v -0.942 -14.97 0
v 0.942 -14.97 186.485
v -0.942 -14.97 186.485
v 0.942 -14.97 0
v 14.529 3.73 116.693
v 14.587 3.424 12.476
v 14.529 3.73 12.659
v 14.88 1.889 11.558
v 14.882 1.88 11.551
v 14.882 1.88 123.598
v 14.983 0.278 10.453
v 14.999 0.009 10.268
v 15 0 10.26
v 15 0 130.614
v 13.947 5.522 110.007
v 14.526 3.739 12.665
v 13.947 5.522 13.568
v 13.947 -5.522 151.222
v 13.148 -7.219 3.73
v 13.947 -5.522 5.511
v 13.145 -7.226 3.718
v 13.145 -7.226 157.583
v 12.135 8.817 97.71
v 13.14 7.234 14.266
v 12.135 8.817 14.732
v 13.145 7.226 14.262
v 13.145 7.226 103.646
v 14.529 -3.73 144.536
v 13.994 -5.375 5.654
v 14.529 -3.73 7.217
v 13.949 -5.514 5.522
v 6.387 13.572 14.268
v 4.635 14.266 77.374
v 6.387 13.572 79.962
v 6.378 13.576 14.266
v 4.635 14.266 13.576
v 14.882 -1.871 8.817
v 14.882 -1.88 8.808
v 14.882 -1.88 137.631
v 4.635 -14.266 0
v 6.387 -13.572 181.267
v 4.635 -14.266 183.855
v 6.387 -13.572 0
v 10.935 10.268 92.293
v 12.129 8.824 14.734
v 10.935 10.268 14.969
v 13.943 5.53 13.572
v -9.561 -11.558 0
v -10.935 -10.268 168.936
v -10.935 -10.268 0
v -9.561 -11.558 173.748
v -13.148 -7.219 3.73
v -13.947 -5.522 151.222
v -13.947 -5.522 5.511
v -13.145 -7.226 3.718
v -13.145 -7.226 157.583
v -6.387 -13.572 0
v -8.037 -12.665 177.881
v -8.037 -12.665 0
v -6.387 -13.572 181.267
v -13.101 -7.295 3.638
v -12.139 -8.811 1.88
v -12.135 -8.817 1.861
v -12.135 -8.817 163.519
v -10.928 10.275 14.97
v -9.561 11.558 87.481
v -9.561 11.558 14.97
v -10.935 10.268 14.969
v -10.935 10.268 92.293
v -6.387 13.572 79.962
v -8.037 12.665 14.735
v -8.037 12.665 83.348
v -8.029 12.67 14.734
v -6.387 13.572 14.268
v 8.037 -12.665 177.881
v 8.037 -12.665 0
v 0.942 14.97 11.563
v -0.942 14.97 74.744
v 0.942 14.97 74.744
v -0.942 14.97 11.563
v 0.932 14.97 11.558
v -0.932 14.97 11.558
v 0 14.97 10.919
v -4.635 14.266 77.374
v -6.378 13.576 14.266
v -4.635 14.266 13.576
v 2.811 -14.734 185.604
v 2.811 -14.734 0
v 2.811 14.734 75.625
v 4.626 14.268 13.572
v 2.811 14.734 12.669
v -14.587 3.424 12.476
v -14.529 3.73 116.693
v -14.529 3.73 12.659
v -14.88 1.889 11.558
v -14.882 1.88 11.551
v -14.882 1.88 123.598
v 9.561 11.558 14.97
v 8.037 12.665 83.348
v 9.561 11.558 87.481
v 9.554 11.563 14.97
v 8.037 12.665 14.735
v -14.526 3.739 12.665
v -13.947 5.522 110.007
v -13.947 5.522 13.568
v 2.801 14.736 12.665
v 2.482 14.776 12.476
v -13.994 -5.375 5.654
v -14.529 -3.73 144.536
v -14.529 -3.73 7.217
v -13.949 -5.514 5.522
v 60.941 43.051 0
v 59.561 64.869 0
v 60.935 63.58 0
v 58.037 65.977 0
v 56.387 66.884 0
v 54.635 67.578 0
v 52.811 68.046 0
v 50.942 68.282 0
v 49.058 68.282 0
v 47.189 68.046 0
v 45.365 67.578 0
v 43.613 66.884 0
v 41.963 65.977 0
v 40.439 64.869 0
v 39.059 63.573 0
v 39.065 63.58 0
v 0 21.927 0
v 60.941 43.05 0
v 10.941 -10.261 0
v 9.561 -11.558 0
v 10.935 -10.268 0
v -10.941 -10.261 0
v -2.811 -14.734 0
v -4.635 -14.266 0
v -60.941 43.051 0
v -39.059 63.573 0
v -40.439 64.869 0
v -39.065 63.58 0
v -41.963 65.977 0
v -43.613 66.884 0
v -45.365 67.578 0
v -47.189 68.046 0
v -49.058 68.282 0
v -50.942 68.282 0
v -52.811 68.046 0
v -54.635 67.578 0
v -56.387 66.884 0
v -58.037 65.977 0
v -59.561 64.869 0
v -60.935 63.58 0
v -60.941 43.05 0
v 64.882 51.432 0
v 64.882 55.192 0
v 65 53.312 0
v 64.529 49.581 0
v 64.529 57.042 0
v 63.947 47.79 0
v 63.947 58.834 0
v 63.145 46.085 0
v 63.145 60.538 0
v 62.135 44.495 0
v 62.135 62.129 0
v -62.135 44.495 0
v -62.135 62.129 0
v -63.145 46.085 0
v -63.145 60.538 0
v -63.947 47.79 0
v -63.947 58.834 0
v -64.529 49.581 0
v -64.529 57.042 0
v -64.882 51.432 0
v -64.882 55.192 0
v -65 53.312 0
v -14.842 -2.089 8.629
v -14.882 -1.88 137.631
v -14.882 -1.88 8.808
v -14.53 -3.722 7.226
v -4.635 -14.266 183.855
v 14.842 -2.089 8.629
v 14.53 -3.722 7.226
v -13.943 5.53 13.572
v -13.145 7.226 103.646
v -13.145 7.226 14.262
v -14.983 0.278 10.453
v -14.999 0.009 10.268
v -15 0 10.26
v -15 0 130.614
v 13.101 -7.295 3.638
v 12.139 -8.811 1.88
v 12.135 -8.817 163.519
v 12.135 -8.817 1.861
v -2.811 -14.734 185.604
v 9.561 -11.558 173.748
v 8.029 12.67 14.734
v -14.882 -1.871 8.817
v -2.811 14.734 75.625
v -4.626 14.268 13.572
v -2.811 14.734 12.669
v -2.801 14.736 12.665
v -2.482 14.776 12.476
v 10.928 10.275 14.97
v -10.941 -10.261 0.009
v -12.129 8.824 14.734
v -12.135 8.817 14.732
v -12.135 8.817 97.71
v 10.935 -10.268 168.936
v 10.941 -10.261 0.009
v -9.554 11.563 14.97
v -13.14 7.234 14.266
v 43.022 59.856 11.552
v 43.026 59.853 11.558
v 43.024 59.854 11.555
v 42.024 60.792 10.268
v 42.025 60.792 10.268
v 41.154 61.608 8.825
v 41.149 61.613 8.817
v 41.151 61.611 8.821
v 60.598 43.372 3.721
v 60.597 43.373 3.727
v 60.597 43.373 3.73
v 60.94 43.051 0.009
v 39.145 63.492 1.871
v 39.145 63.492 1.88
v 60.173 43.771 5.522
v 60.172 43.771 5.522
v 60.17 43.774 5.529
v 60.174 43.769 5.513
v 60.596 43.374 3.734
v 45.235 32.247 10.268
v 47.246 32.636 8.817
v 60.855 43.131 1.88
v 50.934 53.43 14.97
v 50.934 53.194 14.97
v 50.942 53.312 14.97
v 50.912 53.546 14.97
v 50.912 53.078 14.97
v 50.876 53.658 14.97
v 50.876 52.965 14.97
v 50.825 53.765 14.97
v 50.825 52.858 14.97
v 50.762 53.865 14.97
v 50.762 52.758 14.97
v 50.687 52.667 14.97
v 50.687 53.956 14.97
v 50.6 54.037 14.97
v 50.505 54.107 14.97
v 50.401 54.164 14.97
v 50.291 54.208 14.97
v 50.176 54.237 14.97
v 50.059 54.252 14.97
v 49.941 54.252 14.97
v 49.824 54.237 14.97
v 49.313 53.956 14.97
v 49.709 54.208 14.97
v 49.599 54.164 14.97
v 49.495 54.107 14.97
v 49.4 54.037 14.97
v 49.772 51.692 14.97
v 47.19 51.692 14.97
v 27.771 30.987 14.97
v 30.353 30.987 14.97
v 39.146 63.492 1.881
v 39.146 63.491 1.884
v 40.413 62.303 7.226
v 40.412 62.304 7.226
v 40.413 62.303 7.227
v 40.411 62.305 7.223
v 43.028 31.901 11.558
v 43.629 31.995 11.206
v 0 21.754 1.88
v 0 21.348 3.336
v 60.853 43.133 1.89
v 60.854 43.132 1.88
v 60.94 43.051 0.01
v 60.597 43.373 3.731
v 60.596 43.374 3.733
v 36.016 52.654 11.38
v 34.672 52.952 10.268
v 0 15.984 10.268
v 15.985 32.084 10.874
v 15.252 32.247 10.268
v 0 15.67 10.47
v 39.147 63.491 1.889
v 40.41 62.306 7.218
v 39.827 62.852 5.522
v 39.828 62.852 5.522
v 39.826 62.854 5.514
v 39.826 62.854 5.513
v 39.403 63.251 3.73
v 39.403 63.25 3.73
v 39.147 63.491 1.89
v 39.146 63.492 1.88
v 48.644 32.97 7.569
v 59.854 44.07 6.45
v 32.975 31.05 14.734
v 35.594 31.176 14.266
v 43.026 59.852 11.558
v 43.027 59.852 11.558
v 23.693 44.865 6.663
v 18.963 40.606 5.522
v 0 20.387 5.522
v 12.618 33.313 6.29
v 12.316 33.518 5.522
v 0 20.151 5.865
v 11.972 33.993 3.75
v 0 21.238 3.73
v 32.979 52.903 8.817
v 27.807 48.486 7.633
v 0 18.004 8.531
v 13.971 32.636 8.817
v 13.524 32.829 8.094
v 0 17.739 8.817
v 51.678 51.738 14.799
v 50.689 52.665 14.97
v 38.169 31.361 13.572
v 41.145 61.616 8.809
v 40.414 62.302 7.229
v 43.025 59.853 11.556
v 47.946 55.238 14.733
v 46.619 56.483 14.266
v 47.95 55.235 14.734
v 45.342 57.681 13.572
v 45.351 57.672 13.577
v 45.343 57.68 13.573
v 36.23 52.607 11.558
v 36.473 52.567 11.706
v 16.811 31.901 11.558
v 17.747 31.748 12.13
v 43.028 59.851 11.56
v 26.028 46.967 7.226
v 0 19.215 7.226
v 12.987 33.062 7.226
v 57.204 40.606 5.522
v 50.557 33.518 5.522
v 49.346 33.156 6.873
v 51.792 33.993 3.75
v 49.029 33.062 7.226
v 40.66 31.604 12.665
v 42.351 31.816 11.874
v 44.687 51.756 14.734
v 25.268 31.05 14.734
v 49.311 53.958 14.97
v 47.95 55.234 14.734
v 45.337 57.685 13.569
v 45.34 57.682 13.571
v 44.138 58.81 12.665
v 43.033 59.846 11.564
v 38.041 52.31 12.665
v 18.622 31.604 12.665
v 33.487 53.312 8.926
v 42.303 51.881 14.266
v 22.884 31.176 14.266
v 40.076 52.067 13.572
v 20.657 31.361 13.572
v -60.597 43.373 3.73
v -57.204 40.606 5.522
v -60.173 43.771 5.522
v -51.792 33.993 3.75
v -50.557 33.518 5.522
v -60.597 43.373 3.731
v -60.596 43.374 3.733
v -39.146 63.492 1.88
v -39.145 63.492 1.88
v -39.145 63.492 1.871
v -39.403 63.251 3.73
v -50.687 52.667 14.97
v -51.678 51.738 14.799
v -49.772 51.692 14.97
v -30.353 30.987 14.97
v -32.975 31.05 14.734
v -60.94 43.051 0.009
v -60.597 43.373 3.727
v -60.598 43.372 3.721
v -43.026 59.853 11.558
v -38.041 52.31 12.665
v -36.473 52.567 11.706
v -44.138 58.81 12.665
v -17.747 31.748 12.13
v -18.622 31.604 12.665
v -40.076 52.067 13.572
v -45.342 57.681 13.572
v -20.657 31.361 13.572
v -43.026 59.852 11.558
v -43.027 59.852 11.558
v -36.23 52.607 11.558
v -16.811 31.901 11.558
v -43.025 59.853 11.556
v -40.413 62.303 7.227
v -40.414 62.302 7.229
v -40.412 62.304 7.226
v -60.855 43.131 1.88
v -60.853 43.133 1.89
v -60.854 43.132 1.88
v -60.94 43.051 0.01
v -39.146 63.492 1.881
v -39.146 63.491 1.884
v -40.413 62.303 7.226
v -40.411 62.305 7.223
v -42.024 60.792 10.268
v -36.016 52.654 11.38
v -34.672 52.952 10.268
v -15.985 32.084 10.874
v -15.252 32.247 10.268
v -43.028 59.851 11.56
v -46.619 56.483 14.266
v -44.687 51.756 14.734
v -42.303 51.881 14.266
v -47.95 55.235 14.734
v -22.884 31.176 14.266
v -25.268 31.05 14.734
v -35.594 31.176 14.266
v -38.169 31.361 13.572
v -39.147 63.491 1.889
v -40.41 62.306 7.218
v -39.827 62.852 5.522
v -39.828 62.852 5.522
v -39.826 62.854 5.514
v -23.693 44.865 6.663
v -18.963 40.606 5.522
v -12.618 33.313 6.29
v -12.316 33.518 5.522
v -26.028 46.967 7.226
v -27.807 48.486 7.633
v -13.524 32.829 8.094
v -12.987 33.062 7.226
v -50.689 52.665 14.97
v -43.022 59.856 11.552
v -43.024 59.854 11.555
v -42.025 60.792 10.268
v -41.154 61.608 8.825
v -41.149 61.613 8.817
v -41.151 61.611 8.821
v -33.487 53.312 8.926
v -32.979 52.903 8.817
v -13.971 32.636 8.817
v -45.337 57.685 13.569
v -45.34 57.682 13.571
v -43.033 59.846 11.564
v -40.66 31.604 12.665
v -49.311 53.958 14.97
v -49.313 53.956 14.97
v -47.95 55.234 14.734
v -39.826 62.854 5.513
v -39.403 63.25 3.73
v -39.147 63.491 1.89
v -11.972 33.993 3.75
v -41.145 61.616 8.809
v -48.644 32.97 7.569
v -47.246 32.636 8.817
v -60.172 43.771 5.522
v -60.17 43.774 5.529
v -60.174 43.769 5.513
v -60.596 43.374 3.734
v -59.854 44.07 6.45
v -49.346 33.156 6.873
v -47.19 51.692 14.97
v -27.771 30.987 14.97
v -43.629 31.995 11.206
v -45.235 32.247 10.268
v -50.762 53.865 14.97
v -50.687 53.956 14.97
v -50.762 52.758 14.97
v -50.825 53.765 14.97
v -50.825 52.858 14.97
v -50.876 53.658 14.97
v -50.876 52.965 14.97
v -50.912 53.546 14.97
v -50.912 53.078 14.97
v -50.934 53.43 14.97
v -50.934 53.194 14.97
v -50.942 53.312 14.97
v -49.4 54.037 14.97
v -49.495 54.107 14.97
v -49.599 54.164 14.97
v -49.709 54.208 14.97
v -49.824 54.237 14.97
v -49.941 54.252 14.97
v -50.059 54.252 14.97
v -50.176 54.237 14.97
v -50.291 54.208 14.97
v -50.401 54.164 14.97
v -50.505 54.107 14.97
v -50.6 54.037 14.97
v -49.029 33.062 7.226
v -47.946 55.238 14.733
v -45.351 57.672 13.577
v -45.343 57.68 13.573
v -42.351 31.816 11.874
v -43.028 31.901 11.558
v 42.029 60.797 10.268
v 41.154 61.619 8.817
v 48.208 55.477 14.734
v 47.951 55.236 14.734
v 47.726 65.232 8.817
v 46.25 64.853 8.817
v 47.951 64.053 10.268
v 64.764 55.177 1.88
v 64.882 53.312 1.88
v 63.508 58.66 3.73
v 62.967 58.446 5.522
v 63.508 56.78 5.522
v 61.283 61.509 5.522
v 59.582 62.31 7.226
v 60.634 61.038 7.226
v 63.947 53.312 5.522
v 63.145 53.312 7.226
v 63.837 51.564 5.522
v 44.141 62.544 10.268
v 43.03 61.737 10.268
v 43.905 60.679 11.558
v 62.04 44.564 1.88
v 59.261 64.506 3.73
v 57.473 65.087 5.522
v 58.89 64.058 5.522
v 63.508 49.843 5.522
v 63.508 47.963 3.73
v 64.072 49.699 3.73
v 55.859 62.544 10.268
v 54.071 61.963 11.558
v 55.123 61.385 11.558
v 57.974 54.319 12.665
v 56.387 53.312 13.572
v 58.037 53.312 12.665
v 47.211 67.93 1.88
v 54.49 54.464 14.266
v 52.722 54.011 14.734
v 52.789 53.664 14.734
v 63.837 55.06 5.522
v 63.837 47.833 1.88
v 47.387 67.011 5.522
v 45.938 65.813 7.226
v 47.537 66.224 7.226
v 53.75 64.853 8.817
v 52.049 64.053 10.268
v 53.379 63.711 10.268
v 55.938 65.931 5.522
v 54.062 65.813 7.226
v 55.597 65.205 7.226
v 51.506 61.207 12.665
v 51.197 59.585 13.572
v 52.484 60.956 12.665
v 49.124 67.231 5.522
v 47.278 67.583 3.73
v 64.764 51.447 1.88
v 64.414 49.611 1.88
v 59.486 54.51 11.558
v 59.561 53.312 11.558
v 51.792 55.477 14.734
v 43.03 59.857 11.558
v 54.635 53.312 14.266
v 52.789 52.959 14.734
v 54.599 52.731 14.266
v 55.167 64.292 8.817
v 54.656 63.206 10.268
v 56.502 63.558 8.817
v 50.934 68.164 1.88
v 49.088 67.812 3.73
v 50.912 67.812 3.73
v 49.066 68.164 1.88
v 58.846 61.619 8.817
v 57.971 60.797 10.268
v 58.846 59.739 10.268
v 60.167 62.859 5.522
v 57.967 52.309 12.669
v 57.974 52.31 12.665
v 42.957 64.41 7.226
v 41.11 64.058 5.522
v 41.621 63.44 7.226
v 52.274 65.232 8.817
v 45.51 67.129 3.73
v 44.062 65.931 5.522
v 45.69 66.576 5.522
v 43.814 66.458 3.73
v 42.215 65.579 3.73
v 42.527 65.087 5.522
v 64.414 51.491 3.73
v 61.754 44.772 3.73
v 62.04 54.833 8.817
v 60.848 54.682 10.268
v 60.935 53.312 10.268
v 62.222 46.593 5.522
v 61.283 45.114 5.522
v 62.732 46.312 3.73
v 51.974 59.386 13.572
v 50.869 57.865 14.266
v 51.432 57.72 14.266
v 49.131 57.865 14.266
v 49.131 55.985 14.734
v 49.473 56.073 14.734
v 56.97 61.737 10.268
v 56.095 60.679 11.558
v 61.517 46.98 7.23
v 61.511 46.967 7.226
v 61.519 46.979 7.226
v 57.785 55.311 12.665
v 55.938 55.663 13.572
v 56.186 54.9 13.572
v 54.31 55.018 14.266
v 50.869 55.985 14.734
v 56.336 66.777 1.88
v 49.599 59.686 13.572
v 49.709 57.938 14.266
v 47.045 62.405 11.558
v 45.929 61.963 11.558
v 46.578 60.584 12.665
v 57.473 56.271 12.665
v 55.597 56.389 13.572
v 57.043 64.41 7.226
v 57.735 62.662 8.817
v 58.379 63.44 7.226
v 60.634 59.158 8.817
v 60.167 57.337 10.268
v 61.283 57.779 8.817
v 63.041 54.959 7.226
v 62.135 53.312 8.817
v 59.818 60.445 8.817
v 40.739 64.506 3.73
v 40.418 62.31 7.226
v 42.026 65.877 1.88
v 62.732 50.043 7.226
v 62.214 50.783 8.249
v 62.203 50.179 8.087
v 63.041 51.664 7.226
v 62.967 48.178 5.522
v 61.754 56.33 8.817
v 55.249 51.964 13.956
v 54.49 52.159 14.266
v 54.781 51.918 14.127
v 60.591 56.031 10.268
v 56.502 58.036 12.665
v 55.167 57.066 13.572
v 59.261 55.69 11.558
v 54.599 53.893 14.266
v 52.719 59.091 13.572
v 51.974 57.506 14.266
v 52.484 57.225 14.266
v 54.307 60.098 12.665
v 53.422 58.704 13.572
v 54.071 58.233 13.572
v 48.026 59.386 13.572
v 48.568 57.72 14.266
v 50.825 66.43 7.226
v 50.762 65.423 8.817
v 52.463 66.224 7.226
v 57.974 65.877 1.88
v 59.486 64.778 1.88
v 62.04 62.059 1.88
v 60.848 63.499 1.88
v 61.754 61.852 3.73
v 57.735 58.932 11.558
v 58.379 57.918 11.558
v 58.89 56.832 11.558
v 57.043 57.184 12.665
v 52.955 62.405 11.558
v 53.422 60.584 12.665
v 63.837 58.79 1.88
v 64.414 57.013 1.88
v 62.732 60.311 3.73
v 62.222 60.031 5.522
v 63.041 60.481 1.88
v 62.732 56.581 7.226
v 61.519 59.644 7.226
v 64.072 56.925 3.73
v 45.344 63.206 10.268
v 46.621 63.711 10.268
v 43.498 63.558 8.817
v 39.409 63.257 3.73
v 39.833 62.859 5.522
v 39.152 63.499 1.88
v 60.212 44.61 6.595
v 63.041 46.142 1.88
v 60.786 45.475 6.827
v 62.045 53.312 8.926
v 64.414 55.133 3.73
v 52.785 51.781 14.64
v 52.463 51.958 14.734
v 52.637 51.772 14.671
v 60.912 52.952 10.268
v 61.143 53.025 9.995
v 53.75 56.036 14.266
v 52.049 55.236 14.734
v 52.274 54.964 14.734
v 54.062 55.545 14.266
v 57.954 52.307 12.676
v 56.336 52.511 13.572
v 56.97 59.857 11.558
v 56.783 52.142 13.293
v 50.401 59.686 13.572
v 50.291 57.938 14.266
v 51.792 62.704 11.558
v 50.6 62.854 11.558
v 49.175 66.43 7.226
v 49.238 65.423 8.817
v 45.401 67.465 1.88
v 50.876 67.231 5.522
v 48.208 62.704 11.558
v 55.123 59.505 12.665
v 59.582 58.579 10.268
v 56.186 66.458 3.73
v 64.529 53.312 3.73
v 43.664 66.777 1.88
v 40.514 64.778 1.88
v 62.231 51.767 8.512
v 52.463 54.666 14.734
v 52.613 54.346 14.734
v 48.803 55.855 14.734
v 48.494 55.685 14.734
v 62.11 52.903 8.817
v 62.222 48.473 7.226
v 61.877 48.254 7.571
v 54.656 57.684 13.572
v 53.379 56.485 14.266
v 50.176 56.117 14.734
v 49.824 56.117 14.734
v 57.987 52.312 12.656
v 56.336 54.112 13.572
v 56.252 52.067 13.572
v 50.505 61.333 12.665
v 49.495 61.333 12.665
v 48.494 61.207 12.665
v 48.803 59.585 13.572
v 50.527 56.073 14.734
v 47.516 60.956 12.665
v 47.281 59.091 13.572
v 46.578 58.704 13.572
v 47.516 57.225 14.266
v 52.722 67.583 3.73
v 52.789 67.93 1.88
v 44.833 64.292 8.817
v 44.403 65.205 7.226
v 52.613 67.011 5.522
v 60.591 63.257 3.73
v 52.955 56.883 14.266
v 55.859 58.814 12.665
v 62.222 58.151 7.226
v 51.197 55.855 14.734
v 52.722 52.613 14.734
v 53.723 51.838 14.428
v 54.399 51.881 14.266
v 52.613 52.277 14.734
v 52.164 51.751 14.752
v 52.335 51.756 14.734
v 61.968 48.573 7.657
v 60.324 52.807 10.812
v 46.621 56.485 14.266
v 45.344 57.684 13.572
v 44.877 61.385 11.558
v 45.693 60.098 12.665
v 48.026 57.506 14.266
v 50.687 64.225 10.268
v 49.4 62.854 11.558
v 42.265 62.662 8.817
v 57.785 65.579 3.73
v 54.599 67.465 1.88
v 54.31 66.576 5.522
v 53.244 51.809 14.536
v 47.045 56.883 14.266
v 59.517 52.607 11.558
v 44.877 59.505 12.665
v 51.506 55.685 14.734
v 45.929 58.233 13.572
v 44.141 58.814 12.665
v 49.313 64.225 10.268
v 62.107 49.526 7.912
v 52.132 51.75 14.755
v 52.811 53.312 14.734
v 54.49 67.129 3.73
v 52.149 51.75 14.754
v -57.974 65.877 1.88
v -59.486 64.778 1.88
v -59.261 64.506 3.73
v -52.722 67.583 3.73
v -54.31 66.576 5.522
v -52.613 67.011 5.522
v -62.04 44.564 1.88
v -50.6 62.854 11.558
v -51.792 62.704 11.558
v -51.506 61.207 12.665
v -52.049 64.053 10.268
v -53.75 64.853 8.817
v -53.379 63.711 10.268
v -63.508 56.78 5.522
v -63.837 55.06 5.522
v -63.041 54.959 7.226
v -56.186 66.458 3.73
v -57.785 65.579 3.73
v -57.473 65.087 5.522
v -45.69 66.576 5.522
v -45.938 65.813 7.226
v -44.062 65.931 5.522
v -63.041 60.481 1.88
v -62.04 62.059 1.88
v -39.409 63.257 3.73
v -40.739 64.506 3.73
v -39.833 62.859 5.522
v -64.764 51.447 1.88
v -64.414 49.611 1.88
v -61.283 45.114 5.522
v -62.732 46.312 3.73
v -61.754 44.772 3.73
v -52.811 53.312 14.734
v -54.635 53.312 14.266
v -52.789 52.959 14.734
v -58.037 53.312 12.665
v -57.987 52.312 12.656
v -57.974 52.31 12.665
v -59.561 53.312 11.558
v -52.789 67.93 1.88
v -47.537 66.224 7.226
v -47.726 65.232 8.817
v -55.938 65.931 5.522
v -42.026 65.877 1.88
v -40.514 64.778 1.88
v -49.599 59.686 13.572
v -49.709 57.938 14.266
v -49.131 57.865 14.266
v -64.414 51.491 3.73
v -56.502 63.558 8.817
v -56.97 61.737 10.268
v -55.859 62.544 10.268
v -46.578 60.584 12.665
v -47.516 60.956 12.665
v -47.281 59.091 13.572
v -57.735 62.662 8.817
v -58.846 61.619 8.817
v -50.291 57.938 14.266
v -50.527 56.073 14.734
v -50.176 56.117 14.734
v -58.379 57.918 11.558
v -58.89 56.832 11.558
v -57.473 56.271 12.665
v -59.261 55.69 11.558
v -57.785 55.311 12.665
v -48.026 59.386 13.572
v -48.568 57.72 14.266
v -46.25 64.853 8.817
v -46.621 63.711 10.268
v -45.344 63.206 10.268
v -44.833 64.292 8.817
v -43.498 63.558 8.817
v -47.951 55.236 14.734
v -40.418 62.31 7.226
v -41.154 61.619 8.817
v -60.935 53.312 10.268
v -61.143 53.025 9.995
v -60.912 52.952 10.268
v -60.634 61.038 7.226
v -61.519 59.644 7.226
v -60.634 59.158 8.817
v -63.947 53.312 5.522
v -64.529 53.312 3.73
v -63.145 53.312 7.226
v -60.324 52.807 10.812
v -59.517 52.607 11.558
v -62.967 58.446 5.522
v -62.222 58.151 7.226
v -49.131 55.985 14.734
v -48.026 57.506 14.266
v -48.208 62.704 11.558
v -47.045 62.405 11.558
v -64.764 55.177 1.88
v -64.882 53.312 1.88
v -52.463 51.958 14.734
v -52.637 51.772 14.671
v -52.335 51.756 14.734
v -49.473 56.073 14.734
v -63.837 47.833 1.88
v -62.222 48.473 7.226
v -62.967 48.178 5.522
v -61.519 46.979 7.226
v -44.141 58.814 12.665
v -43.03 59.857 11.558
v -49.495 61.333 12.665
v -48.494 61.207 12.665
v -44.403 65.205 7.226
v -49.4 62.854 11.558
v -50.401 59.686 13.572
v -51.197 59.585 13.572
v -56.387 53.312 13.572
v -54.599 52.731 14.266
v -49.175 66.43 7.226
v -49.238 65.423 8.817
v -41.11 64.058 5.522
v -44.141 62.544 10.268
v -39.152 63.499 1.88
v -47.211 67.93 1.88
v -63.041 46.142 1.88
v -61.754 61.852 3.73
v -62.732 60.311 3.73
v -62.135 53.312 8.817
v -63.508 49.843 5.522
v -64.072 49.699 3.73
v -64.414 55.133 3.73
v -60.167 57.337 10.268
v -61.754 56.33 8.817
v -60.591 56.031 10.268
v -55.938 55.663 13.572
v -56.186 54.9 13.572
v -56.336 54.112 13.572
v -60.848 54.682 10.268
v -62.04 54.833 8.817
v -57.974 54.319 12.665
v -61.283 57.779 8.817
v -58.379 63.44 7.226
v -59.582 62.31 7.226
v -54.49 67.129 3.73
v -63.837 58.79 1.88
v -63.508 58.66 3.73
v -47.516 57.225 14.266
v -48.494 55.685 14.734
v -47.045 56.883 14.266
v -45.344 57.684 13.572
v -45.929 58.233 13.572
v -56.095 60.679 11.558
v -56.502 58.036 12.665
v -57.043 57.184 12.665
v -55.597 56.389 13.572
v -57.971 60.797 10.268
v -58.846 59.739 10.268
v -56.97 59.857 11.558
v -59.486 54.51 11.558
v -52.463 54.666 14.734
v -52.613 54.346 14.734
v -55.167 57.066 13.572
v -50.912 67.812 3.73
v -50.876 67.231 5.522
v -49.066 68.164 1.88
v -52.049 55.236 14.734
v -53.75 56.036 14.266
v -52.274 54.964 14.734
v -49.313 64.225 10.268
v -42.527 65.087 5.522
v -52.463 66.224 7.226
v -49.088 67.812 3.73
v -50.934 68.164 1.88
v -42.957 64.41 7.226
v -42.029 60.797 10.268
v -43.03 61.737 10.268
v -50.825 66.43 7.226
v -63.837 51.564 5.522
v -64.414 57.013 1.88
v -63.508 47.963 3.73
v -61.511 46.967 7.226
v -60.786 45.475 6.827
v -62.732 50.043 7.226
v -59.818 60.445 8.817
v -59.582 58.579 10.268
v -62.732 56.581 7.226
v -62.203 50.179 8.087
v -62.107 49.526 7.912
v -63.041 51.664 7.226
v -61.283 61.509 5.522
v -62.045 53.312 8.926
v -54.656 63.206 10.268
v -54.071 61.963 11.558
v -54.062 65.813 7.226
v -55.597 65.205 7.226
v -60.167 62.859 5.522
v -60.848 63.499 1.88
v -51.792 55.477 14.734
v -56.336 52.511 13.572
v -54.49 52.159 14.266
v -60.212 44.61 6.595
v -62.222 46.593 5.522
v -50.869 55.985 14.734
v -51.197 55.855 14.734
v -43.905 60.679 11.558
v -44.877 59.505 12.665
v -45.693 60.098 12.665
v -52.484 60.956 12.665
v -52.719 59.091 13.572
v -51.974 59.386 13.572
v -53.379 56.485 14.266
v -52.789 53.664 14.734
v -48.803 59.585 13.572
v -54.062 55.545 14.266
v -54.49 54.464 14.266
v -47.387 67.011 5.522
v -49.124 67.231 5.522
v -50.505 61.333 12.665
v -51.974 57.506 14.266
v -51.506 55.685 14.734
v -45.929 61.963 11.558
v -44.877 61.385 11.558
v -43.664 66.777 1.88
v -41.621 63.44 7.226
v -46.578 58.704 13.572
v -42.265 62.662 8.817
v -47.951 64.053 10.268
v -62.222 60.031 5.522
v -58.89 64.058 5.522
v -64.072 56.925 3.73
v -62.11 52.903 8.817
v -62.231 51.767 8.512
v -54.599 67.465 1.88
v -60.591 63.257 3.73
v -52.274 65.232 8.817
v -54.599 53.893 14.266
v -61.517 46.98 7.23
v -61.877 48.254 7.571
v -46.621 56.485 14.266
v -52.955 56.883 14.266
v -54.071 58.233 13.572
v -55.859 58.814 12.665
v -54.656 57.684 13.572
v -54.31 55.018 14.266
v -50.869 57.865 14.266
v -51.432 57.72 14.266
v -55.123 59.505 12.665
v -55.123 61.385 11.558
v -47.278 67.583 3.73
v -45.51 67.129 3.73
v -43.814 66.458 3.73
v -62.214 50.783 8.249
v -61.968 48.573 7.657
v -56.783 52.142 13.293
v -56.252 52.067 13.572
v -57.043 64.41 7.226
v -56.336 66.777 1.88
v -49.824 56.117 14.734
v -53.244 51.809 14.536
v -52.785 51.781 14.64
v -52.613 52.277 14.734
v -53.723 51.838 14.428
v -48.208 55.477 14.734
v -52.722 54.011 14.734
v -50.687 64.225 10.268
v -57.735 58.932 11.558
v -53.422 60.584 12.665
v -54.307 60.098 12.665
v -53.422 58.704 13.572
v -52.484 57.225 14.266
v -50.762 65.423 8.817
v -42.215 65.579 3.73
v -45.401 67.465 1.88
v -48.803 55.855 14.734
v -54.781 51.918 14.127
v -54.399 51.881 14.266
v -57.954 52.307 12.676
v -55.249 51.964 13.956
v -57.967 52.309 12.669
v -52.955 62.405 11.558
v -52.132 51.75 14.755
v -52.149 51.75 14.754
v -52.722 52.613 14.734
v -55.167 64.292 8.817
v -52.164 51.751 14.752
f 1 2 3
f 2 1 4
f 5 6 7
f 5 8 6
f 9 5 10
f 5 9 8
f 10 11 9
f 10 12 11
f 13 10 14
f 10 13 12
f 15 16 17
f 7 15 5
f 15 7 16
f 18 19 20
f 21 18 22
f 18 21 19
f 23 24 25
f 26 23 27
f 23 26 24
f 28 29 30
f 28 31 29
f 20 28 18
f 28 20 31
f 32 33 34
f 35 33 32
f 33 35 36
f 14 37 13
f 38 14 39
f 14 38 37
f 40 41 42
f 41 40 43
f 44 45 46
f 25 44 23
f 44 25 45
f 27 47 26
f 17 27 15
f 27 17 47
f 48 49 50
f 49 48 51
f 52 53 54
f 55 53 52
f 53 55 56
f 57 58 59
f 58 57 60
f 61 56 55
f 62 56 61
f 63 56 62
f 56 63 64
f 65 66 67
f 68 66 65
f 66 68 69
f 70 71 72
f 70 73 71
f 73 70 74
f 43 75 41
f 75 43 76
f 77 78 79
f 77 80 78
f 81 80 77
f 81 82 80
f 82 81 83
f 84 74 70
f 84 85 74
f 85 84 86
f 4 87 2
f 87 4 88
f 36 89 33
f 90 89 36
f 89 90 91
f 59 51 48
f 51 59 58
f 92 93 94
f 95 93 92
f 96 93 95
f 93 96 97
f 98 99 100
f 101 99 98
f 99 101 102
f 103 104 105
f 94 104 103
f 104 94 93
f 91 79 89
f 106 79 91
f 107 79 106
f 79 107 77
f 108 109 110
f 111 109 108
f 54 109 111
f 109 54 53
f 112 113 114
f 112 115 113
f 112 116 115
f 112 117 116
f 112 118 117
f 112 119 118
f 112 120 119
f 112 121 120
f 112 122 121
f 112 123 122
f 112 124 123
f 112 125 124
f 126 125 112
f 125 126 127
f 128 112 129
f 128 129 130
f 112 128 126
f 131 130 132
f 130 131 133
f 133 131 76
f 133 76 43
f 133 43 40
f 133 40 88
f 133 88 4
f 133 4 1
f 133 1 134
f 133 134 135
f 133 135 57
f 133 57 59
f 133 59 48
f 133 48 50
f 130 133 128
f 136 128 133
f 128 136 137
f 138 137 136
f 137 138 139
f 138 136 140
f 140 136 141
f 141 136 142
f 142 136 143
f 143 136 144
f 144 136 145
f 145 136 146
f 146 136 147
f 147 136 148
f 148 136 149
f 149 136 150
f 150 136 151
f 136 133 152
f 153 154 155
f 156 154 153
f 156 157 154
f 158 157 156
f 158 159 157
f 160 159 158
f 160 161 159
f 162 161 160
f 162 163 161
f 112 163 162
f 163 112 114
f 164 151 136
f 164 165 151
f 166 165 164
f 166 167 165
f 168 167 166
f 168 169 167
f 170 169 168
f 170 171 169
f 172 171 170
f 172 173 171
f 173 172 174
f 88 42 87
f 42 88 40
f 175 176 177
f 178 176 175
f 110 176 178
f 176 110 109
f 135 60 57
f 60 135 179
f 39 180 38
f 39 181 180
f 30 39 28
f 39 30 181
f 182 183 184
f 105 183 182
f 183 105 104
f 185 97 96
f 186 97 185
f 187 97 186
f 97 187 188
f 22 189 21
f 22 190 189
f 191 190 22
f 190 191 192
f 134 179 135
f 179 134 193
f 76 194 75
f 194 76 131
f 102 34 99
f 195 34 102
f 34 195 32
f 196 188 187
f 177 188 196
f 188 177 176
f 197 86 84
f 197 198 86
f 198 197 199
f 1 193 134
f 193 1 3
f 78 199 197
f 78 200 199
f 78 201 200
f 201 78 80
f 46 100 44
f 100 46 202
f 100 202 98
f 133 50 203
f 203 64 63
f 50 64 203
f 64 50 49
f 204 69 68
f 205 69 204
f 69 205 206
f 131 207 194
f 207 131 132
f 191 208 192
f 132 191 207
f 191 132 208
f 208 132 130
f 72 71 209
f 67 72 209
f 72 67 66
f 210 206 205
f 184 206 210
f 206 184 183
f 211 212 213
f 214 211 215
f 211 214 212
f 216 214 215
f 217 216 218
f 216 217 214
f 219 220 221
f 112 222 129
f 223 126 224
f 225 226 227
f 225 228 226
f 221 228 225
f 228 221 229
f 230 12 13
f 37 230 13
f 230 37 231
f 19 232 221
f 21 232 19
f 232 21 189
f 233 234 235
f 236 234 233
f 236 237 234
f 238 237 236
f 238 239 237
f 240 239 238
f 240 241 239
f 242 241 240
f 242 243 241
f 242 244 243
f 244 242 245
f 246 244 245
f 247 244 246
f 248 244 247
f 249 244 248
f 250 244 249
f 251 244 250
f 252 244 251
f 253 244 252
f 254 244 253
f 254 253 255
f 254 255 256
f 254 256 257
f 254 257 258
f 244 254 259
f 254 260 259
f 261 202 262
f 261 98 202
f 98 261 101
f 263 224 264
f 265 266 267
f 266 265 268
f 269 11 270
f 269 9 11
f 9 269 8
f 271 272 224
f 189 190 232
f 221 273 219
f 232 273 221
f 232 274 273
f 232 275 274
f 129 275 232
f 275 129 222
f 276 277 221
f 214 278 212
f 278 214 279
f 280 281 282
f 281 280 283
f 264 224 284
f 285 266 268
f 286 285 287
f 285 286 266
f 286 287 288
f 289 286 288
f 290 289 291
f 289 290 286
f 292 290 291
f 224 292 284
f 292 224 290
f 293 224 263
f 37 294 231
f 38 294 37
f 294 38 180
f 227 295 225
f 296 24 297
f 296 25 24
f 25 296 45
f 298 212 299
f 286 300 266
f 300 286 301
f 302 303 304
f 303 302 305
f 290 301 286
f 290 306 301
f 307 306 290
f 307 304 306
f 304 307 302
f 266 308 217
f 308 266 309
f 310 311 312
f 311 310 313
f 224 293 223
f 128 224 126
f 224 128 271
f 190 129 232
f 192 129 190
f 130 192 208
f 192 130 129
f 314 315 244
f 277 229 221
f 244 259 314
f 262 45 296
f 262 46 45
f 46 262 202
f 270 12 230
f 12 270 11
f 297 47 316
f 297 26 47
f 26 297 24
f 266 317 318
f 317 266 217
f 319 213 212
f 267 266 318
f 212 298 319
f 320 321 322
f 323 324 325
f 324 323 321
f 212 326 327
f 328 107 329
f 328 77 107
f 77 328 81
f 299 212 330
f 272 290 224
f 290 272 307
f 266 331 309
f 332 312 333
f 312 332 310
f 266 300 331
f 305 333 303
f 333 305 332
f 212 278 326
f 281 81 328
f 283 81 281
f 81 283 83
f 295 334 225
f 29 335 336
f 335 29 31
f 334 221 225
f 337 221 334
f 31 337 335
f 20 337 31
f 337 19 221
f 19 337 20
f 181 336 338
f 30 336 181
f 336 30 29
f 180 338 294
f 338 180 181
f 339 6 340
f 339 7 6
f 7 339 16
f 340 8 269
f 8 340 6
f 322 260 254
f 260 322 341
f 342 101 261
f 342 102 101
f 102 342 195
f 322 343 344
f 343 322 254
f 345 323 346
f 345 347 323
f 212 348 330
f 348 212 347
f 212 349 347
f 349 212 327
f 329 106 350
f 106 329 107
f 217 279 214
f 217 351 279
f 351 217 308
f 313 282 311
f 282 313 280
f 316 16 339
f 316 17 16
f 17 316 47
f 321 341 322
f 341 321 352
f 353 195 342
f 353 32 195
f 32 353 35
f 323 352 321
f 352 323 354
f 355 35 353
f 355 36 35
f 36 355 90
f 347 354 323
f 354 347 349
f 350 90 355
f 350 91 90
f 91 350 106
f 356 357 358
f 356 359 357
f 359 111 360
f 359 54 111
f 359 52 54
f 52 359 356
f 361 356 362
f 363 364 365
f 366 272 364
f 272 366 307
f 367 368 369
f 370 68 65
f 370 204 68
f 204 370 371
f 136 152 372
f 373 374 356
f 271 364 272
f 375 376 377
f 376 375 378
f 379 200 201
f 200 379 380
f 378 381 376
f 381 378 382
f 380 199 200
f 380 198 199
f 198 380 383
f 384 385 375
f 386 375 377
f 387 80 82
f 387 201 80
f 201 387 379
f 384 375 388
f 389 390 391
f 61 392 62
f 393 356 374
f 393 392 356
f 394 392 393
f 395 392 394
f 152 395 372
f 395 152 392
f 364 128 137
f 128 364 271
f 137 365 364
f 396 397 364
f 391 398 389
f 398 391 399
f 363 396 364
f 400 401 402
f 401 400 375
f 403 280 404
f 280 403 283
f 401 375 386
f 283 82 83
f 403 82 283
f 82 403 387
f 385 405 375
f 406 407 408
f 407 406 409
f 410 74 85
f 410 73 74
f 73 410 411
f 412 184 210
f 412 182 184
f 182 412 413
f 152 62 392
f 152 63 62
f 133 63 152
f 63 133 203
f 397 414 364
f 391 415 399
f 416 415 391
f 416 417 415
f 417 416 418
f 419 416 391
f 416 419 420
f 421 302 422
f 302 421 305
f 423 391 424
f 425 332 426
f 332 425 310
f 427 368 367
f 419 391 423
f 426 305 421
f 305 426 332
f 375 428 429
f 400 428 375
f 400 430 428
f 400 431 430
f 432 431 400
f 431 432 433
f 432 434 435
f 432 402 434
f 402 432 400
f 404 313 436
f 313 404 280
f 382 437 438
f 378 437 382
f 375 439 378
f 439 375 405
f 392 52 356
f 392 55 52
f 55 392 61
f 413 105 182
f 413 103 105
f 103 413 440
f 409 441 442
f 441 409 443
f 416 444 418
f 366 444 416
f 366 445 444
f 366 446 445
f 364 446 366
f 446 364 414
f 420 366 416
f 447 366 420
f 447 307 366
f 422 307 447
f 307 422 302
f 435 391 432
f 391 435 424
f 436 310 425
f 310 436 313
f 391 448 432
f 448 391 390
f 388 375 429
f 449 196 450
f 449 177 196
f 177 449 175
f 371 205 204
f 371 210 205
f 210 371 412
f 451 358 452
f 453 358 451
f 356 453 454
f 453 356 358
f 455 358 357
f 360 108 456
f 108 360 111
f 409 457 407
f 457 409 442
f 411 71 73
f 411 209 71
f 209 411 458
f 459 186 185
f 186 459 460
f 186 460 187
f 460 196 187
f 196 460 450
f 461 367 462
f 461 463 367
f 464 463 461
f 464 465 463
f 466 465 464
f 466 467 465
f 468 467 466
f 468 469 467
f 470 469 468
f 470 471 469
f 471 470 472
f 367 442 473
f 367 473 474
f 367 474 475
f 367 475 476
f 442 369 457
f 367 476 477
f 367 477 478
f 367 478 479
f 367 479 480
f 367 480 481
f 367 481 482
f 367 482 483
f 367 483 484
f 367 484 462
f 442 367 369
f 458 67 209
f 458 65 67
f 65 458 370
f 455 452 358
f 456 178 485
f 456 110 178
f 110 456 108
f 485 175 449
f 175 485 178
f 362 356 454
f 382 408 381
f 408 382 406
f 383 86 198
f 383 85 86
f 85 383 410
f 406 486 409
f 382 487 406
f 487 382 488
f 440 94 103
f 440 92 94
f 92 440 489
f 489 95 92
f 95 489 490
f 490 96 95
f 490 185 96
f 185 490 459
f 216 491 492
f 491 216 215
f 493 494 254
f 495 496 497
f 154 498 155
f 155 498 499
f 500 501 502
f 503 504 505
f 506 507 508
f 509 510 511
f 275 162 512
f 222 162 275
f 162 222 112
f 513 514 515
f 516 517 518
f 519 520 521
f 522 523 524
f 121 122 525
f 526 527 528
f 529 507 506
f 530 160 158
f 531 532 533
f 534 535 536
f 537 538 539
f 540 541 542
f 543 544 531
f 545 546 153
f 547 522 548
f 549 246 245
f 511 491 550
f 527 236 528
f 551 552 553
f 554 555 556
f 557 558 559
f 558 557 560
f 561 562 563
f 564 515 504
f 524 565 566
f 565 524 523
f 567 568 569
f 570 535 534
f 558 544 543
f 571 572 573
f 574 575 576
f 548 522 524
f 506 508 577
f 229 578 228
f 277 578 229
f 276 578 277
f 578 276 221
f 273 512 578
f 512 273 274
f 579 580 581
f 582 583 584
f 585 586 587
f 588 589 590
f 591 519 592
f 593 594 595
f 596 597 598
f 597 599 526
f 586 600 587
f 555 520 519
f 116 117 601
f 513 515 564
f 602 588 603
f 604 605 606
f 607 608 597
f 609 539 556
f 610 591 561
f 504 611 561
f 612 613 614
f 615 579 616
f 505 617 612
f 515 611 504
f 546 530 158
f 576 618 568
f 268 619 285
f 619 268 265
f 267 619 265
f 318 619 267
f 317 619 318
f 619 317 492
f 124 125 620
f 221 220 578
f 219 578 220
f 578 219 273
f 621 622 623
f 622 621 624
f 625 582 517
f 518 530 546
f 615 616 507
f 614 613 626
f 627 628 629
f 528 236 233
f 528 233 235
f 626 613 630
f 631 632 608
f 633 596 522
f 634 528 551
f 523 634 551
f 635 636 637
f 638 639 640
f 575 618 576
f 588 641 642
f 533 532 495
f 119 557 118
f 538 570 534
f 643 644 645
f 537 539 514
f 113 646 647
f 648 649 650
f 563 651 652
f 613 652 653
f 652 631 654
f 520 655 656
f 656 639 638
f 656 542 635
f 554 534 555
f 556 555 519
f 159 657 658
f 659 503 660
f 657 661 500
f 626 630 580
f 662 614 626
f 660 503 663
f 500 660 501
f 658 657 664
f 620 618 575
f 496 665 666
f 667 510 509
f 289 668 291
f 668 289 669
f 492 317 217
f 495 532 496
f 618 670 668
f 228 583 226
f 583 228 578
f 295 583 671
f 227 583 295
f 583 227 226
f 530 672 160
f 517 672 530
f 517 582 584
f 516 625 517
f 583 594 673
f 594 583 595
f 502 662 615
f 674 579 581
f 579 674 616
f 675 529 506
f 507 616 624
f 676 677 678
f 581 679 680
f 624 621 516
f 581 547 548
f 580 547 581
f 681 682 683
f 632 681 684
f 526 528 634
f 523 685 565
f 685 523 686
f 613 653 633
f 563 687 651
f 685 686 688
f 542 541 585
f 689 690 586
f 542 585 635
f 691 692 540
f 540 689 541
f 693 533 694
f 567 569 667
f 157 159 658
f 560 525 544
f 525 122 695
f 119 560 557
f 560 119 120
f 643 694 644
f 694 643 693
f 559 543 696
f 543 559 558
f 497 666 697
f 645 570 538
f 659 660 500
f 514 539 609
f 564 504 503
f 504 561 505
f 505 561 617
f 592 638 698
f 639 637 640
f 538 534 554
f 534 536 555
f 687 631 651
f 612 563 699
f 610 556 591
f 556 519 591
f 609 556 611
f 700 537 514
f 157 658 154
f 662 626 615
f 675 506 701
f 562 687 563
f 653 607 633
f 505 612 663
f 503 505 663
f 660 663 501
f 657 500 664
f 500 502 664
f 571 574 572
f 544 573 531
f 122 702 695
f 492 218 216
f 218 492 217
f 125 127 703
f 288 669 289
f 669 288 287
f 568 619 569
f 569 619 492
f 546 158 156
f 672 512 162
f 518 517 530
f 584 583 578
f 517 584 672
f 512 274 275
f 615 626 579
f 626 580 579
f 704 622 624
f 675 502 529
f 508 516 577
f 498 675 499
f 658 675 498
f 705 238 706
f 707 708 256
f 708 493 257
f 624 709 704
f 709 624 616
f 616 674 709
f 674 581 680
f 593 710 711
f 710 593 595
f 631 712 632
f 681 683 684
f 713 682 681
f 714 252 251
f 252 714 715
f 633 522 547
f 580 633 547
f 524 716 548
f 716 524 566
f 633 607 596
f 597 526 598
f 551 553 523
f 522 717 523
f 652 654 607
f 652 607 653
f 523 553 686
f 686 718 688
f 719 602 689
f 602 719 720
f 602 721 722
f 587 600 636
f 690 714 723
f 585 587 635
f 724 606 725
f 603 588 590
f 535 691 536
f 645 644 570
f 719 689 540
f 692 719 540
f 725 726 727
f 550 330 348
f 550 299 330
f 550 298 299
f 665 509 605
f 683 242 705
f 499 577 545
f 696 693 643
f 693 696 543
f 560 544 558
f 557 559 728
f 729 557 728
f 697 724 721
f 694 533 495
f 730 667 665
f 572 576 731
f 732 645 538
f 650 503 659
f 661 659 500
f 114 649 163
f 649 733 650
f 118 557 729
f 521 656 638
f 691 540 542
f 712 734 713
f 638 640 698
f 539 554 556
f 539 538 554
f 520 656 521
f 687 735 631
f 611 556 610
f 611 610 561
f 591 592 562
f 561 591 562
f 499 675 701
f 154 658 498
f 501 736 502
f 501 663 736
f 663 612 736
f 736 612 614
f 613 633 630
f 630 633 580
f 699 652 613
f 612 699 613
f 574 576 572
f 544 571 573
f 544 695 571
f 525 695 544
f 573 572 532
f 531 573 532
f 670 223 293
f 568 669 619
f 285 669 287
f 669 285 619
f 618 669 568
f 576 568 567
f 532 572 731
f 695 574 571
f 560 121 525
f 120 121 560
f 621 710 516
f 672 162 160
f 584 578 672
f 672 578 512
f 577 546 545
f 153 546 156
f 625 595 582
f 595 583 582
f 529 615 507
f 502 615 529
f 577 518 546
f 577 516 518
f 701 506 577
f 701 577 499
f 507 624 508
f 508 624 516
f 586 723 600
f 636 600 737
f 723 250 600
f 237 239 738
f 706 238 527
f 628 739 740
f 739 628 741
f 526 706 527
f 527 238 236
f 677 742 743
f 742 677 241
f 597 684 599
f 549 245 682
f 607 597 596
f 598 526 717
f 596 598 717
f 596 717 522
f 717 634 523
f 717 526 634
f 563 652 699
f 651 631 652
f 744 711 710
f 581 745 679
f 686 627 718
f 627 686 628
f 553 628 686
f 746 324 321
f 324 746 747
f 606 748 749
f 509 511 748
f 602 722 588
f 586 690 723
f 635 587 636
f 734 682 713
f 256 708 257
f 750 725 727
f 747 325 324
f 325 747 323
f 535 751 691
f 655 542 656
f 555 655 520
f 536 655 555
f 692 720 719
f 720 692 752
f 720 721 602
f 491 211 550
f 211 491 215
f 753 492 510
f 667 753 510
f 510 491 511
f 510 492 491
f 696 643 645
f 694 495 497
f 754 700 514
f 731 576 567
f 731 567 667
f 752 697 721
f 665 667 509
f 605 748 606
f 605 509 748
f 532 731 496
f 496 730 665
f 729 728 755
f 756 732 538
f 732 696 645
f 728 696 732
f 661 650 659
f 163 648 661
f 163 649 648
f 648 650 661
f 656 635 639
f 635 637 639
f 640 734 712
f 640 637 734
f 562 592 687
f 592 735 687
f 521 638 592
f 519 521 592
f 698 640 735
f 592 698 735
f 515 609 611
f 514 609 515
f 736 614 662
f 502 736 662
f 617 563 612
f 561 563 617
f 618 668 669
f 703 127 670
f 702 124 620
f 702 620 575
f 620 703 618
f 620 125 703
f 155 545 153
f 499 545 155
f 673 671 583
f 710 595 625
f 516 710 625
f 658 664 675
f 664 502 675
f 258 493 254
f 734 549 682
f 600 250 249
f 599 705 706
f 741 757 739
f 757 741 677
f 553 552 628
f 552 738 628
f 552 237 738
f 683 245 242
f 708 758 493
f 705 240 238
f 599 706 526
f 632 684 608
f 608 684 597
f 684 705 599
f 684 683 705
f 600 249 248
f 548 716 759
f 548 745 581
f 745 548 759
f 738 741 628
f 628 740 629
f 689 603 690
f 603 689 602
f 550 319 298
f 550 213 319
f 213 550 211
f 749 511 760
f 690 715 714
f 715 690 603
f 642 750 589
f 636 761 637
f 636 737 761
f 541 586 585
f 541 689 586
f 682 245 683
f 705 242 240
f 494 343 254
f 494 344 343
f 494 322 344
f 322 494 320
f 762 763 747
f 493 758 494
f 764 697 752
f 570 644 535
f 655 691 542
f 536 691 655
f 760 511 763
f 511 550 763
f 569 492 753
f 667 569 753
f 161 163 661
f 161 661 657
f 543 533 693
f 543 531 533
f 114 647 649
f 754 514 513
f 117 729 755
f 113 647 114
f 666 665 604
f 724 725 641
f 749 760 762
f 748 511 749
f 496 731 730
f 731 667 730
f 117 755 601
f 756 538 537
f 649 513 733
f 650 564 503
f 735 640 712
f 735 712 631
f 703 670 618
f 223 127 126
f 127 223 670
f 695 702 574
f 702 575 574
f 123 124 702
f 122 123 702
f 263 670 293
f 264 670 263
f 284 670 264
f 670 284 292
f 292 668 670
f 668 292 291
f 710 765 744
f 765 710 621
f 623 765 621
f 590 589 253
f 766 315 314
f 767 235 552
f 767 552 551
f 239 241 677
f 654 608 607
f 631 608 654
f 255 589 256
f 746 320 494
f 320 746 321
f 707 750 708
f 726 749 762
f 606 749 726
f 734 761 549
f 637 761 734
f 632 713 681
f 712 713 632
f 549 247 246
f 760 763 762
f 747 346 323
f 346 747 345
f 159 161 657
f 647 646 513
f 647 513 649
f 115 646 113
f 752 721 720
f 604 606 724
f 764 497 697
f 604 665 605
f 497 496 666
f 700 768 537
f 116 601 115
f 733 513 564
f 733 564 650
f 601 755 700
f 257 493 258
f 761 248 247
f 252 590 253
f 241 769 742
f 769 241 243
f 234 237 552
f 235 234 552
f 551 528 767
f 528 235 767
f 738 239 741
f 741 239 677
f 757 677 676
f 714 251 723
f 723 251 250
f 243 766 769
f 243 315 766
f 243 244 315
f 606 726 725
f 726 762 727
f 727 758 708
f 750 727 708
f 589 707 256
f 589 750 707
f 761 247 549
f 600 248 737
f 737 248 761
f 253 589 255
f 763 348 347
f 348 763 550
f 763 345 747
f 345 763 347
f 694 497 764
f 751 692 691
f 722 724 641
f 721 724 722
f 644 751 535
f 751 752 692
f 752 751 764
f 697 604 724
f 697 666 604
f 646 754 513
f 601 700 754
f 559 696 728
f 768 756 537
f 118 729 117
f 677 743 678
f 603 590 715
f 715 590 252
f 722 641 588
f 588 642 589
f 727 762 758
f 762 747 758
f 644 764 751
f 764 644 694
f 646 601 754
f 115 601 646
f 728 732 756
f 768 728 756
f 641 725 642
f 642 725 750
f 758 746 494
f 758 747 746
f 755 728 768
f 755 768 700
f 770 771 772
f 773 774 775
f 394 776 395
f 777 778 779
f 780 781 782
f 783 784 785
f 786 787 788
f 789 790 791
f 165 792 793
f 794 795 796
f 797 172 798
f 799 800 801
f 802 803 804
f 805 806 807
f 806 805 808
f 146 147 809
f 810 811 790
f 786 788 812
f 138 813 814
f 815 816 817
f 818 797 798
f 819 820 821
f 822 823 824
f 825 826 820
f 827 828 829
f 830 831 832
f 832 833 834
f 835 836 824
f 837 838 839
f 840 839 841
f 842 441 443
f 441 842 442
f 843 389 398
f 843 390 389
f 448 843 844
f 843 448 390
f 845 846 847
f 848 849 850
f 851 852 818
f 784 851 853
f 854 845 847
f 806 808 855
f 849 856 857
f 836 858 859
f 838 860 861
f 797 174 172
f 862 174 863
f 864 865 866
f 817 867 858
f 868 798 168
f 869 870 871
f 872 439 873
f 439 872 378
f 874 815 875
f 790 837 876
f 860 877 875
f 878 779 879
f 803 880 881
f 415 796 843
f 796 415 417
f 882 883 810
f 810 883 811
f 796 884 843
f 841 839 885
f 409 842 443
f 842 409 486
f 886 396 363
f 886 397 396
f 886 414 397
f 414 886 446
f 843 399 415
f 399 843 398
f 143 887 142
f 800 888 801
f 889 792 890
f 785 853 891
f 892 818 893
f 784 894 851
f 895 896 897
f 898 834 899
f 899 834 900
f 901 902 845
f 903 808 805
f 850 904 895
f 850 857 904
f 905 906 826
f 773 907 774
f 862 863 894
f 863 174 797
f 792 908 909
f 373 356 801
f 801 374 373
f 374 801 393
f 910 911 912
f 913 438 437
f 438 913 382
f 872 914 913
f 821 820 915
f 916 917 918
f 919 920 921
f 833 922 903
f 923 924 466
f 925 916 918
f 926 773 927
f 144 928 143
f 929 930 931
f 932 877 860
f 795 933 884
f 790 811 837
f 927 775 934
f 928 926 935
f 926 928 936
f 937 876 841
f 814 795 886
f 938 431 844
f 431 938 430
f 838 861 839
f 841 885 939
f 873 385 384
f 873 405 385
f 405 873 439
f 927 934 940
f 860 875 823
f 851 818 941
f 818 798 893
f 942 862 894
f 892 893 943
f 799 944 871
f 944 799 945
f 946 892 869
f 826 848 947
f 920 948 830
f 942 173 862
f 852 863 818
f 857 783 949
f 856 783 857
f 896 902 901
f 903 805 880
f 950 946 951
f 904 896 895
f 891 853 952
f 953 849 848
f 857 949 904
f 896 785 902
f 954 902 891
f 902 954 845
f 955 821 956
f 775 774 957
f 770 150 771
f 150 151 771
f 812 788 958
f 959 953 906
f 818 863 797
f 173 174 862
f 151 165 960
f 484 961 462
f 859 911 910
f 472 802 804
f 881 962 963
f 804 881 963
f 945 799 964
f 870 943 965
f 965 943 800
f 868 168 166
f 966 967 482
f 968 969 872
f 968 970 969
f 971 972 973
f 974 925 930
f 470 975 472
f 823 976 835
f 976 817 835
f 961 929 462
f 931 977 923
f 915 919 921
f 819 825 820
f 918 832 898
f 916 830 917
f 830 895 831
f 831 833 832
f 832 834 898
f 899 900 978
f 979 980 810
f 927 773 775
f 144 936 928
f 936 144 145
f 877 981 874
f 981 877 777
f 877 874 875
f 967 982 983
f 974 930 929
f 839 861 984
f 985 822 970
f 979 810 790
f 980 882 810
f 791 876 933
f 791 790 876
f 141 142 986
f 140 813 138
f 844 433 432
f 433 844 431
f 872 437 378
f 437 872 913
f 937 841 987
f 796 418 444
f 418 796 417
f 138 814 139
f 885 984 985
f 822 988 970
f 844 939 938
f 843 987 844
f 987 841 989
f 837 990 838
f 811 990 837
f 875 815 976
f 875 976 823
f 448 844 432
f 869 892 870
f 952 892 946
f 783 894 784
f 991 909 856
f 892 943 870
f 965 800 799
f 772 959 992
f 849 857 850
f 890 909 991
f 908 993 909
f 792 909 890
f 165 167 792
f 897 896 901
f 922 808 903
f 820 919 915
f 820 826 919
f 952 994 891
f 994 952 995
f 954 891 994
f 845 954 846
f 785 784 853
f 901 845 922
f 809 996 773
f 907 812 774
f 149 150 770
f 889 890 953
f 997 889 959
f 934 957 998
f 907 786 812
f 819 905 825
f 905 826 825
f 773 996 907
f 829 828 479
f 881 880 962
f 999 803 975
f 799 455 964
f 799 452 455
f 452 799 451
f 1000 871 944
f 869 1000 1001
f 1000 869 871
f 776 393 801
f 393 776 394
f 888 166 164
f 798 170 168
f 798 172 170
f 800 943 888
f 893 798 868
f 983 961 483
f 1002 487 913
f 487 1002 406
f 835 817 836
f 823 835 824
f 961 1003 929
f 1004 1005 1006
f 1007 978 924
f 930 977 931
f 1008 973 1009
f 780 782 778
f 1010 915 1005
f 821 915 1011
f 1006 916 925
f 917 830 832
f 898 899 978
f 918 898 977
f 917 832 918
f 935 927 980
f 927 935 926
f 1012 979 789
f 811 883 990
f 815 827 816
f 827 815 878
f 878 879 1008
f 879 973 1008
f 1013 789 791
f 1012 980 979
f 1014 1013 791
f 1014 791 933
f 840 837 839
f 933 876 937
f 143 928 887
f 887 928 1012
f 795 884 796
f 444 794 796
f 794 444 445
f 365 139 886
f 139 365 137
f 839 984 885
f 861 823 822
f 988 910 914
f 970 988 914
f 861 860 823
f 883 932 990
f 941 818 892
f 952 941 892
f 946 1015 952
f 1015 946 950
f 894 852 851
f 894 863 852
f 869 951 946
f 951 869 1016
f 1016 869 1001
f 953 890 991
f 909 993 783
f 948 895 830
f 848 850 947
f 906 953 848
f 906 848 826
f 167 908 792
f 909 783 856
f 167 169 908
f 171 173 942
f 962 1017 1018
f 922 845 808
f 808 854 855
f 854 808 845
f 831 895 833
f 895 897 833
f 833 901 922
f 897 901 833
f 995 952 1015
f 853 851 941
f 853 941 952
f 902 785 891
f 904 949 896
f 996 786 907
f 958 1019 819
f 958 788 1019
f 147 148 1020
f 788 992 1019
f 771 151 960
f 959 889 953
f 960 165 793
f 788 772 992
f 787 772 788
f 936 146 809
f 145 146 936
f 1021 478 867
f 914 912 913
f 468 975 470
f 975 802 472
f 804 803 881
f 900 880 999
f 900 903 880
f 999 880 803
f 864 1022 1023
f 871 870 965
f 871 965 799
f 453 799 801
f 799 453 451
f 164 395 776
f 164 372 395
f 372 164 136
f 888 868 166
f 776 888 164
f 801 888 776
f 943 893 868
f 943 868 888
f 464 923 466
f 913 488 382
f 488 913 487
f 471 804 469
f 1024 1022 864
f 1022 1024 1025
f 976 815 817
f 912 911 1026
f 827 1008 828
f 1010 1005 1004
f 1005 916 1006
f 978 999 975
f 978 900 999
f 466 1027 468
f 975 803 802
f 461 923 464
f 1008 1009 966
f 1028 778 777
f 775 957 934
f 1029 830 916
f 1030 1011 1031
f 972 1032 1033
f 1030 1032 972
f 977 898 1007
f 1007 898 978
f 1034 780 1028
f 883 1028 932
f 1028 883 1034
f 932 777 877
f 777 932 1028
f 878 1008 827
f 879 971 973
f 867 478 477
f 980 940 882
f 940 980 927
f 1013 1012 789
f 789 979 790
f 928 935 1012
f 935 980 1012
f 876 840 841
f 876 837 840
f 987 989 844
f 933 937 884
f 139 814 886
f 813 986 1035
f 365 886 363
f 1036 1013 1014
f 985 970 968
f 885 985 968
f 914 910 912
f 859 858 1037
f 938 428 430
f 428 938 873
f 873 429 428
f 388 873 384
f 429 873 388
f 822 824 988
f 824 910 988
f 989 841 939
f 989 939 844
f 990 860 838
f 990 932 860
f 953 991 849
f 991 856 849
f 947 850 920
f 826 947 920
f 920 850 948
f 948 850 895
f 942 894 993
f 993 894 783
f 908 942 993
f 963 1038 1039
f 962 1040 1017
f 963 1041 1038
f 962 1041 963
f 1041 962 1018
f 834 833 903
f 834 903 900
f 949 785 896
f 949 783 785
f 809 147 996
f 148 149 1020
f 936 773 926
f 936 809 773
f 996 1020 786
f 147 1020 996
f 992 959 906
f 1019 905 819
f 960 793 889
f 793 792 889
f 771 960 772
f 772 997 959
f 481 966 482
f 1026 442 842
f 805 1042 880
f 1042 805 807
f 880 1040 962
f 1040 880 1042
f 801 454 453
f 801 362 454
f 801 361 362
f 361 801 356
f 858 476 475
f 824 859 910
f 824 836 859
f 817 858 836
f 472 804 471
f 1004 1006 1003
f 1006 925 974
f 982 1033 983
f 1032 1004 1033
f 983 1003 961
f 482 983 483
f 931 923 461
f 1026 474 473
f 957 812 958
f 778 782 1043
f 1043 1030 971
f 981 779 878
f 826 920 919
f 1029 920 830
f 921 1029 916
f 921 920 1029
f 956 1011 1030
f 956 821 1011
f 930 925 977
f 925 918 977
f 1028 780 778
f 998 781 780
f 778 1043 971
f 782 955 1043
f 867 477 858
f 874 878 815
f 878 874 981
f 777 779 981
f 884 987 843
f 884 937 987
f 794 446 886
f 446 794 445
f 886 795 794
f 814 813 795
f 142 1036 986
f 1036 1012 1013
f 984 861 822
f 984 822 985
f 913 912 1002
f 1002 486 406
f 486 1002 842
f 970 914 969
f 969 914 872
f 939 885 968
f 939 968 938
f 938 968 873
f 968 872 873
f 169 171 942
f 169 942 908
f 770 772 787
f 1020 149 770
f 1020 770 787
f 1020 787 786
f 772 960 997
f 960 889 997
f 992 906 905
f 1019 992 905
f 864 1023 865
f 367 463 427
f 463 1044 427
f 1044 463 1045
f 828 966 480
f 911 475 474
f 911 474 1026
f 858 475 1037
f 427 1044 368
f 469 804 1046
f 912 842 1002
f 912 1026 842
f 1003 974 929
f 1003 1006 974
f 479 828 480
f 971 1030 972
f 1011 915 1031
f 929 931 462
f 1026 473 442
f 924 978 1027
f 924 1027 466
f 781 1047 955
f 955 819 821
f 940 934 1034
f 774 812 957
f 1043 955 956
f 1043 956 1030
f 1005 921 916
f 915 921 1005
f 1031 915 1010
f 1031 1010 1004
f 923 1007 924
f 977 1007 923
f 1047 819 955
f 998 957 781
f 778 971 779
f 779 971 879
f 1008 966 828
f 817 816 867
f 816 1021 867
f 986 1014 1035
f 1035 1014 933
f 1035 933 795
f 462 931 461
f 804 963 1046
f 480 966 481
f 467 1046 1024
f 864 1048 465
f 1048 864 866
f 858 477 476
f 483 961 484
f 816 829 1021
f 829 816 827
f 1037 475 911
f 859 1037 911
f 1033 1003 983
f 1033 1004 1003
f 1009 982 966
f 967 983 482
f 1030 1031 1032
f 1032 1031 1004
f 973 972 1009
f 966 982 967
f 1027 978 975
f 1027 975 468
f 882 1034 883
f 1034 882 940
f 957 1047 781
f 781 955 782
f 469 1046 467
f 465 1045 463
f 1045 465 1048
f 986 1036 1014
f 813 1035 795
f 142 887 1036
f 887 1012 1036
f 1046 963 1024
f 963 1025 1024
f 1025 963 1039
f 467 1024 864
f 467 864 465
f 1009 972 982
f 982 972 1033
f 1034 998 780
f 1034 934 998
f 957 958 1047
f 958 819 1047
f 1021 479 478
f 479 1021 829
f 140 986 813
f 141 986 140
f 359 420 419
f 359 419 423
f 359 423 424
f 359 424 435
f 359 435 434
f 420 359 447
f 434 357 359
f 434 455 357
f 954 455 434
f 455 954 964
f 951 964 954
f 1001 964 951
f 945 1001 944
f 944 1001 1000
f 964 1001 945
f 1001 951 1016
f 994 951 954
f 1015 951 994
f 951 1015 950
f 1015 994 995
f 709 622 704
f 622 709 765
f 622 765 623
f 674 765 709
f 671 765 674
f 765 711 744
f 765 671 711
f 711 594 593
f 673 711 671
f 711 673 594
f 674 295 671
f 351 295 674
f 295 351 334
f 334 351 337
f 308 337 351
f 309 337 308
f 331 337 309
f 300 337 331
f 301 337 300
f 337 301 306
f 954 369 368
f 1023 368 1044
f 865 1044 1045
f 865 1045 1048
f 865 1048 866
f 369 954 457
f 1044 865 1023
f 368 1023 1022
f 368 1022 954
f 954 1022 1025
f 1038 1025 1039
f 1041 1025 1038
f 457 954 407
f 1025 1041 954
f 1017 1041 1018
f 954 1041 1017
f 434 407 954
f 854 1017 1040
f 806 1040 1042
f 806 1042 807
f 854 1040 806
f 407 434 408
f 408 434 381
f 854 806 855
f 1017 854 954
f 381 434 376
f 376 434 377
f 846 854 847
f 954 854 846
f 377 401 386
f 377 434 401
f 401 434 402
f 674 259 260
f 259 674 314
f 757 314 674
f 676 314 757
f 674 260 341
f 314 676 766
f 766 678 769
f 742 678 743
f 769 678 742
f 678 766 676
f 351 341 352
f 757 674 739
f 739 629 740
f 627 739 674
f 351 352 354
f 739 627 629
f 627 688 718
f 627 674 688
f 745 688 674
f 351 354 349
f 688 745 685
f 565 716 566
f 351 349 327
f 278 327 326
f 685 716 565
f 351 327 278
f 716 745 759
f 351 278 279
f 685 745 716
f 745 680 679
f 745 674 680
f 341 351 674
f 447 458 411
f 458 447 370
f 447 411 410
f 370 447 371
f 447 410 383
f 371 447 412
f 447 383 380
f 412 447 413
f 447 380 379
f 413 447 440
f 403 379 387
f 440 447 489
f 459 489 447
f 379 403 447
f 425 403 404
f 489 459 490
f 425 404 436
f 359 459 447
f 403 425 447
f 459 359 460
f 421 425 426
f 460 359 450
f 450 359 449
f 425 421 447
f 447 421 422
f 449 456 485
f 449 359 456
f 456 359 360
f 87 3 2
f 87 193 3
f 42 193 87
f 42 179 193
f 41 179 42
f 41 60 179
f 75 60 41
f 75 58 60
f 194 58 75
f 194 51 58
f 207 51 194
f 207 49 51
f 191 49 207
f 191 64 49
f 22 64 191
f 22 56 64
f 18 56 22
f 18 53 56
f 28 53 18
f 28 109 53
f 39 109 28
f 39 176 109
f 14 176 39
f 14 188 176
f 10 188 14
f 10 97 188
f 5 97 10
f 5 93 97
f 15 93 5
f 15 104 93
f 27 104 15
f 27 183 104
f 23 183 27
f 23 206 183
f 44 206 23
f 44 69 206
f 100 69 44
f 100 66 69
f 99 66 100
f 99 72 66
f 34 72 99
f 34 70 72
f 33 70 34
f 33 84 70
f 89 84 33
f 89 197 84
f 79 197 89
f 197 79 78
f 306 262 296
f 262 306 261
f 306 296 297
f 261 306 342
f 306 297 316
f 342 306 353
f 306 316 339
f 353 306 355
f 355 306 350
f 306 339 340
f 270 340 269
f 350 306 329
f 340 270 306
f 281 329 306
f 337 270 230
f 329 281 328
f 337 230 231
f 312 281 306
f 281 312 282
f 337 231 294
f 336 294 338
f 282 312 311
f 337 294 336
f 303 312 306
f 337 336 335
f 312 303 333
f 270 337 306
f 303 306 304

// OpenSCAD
bookx=150;//Book Width
booky=20; //Book Thickness
bookz=200;// Book Height
angle=15; //Desired Angle
size=30; //Preferred Cylinder Diameter, will resize if book thickness requires it
$fn=50;


//Calculated Variables
calsize=max(size,2*booky*sin(angle)/(2/3));
zsize=calsize;
standz=bookz*cos(angle);// 250;
standy=(3/4)*(bookz*sin(angle)+booky*cos(angle));//60;
standx=(2/3)*bookx;//150;
standlen=sqrt(pow(standy,2)+pow(standx/2,2));
standangle=atan(standx/(2*standy));

difference()
{
	union()
	{
		cylinder(d=zsize, h=standz);
		
		rotate([-90,0,-standangle])
		cylinder(d=calsize, h=standlen);

		rotate([-90,0,standangle])
		cylinder(d=calsize, h=standlen);

		translate([standlen*sin(standangle),standlen*cos(standangle),0])
		sphere(d=calsize);

		translate([-standlen*sin(standangle),standlen*cos(standangle),0])
		sphere(d=calsize);

	}
	//Remove slot, trim back to angle
	translate([0,standlen*cos(standangle)-booky*cos(angle),calsize/8])
	rotate([angle,0,0])
	translate([-bookx/2,0,0])
	union()
	{
		cube([bookx,booky,bookz]);
		translate([0,0,30])
		cube([bookx,booky*10,bookz-30]);
	}
	// Remove bottom half of cylinders
	translate([-standlen*2,-standlen*2,-100])
	cube([standlen*4,standlen*4,100]);
}
	//Renders Book to help guide
	*translate([0,standlen*cos(standangle)-booky*cos(angle),calsize/8])
	rotate([angle,0,0])
	translate([-bookx/2,0,0])
	union()
	{
		cube([bookx,booky,bookz]);
		translate([0,0,30])
		cube([bookx,booky,bookz-30]);
	}
